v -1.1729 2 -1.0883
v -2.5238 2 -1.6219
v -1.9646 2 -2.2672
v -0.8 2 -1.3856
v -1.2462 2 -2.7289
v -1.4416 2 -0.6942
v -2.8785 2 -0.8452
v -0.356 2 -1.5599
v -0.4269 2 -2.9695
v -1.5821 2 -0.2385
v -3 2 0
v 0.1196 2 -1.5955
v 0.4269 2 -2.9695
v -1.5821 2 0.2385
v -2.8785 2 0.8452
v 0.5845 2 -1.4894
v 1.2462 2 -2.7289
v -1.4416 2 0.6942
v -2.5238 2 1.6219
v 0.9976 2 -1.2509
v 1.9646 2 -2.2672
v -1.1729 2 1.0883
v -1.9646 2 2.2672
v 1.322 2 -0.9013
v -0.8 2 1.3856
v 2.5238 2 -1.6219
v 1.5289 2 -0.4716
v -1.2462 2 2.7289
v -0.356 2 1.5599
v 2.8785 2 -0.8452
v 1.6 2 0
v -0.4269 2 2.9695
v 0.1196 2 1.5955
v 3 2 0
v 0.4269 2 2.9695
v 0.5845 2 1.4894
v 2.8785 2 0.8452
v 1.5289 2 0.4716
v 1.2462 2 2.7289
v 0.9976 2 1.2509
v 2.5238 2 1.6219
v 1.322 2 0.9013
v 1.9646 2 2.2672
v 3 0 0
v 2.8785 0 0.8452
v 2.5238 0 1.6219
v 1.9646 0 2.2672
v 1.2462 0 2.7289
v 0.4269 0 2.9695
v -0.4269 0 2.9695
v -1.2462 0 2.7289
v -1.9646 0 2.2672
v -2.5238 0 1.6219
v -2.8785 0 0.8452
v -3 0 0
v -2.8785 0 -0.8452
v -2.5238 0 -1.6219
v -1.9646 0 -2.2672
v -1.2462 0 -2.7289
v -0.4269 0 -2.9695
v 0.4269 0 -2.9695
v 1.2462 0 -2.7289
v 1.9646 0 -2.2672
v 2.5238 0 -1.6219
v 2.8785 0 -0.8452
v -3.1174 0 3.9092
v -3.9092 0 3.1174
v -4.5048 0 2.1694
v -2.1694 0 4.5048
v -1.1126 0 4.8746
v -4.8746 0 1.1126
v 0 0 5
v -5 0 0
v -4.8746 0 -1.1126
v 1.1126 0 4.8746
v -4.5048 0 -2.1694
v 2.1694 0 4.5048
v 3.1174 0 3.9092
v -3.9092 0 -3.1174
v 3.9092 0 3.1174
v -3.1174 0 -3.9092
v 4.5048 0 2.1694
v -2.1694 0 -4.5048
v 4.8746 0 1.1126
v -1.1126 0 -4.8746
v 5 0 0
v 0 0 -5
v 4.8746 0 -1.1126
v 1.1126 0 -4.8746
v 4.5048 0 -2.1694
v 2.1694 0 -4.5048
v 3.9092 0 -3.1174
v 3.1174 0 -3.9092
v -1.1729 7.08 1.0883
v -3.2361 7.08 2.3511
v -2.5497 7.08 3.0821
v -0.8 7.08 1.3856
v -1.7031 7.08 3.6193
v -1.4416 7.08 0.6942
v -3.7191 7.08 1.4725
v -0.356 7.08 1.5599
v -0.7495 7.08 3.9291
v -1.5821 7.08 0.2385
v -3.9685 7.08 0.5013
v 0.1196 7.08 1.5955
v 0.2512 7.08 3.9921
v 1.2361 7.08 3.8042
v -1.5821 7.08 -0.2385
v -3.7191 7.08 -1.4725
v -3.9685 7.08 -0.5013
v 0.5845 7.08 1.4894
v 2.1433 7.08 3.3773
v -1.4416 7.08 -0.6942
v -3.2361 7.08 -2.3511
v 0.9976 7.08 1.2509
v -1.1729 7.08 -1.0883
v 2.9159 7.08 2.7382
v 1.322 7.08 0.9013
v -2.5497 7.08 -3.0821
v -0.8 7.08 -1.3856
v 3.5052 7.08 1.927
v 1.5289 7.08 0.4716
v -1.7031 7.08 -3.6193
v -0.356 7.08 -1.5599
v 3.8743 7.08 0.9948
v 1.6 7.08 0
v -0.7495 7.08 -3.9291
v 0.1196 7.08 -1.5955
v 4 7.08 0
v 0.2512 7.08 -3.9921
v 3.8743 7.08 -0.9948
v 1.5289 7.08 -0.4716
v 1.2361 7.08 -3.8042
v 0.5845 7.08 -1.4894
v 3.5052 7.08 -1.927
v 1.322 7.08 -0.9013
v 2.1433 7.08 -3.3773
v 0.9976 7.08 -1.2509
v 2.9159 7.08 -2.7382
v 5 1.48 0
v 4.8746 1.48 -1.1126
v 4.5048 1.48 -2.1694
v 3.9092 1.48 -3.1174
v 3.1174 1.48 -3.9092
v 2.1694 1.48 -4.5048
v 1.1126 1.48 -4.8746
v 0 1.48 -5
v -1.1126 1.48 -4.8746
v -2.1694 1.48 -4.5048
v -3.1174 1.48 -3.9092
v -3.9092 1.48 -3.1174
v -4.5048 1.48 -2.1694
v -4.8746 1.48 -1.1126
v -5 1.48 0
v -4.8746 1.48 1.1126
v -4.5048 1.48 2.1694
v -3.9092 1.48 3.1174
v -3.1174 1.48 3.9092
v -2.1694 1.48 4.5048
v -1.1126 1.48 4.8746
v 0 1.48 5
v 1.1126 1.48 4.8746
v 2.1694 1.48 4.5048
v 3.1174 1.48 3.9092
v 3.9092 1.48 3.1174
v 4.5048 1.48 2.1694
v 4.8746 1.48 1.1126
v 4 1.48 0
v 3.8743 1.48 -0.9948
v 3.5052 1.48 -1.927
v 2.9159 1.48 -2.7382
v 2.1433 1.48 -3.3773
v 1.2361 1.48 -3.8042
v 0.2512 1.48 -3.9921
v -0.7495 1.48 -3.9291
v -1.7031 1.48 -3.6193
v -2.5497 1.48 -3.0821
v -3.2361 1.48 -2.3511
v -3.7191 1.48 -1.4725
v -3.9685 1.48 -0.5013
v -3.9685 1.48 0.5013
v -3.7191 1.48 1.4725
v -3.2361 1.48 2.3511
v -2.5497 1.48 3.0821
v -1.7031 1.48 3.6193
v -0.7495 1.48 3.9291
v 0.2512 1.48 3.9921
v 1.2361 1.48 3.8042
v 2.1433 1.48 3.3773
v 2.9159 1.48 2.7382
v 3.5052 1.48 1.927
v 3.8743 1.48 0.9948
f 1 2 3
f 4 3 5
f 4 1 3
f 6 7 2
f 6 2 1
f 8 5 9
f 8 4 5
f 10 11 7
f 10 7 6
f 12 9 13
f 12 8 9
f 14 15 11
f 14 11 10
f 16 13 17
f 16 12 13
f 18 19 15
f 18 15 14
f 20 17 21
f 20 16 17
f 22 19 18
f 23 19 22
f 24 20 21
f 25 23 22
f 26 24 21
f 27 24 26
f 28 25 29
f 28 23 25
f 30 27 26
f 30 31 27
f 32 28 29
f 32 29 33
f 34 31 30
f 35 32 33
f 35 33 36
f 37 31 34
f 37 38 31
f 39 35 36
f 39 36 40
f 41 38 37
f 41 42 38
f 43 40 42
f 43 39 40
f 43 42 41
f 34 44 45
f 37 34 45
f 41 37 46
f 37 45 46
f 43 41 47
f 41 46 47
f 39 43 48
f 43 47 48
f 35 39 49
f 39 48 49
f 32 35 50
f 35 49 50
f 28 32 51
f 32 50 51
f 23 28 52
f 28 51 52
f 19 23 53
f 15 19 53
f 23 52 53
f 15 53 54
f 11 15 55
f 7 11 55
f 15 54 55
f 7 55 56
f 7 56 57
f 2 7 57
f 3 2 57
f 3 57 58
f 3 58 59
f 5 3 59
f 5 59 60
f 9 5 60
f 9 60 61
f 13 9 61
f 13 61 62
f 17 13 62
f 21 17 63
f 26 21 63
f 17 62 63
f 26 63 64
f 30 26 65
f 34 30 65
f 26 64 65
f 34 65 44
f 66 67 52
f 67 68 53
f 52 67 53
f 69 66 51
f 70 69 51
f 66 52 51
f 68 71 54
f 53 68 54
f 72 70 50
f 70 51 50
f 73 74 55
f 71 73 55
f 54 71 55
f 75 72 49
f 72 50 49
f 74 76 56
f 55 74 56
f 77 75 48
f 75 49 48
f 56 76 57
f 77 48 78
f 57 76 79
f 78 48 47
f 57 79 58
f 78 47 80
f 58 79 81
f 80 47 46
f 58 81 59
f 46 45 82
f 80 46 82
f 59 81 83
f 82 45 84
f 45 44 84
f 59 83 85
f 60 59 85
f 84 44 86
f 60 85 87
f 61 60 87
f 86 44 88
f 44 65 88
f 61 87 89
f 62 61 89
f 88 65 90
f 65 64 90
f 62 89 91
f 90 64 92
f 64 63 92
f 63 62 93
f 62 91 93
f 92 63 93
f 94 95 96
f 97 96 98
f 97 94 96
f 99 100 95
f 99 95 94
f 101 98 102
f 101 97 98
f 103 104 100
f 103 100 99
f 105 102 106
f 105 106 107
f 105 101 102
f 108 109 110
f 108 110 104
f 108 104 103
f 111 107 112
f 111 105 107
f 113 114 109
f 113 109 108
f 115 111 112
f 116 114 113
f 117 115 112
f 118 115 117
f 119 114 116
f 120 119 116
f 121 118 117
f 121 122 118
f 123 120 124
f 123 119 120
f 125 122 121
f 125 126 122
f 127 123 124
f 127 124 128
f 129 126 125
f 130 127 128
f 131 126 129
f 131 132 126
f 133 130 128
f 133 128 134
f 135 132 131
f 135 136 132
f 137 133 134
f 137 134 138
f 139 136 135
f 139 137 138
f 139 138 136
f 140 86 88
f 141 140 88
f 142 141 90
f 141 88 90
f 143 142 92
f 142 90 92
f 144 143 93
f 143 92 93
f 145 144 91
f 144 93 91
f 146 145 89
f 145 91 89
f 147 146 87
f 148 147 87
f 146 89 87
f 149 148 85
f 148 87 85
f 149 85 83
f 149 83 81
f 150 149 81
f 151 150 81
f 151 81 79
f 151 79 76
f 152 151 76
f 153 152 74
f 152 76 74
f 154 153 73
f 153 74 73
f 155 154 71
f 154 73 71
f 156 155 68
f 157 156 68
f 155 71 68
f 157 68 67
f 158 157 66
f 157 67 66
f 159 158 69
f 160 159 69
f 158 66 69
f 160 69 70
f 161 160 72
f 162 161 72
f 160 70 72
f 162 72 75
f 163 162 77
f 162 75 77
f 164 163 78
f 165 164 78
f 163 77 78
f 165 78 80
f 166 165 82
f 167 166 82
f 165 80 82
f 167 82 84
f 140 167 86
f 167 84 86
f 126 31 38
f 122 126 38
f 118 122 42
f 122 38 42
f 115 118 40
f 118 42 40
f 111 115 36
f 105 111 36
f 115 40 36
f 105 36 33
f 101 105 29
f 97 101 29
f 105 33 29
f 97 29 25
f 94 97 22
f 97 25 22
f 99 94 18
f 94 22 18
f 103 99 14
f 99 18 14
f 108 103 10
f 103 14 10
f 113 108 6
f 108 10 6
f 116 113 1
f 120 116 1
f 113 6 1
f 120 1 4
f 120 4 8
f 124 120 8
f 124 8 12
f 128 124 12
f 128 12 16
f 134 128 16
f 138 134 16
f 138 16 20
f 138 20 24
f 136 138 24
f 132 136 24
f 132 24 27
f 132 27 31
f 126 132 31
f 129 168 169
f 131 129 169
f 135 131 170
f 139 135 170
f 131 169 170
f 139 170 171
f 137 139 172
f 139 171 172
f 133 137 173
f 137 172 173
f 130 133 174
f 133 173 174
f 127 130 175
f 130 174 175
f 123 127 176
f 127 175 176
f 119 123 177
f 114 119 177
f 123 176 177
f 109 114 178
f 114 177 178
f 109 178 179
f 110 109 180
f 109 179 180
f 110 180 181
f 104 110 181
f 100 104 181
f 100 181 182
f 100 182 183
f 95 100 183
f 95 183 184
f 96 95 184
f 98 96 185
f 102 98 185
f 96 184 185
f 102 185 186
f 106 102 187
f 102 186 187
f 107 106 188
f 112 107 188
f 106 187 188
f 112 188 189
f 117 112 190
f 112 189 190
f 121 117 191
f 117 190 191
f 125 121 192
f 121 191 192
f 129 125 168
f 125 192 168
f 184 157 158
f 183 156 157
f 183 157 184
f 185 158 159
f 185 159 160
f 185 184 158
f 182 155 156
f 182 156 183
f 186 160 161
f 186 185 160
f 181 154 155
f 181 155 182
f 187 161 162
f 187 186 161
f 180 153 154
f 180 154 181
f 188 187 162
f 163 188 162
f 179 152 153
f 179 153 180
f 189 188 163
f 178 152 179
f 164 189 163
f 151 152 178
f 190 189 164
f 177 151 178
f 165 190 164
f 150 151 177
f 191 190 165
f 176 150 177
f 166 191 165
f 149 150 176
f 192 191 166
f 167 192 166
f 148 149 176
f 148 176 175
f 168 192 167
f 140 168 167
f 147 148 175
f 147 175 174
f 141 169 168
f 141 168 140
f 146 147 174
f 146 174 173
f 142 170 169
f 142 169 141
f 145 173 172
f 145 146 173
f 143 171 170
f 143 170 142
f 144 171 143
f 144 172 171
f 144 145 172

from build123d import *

# Parameters (mm, degrees)
SKETCH1_R           = 5
BOSS_EXTRUDE1_DEPTH = 1.48
SKETCH2_R           = 4
BOSS_EXTRUDE2_DEPTH = 5.6
SKETCH3_R           = 1.6
CUT_EXTRUDE1_DEPTH  = 8.08
SKETCH4_R           = 3
CUT_EXTRUDE2_DEPTH  = 2


with BuildPart() as part:
    # Sketch1 → Boss-Extrude1 (new body)
    with BuildSketch(Plane(origin=(0, 0, 0), x_dir=(1, 0, 0), z_dir=(0, 1, 0))):
        Circle(SKETCH1_R)
    extrude(amount=BOSS_EXTRUDE1_DEPTH)

    # Sketch2 → Boss-Extrude2 (add)
    with BuildSketch(Plane(origin=(0, 1.48, 0), x_dir=(1, 0, 0), z_dir=(0, 1, 0))):
        Circle(SKETCH2_R)
    extrude(amount=BOSS_EXTRUDE2_DEPTH)

    # Sketch3 → Cut-Extrude1 (cut, through all)
    with BuildSketch(Plane.XZ):
        Circle(SKETCH3_R)
    extrude(amount=-CUT_EXTRUDE1_DEPTH, mode=Mode.SUBTRACT)

    # Sketch4 → Cut-Extrude2 (cut)
    with BuildSketch(Plane.XZ):
        Circle(SKETCH4_R)
    extrude(amount=-CUT_EXTRUDE2_DEPTH, mode=Mode.SUBTRACT)


solid = part.part
